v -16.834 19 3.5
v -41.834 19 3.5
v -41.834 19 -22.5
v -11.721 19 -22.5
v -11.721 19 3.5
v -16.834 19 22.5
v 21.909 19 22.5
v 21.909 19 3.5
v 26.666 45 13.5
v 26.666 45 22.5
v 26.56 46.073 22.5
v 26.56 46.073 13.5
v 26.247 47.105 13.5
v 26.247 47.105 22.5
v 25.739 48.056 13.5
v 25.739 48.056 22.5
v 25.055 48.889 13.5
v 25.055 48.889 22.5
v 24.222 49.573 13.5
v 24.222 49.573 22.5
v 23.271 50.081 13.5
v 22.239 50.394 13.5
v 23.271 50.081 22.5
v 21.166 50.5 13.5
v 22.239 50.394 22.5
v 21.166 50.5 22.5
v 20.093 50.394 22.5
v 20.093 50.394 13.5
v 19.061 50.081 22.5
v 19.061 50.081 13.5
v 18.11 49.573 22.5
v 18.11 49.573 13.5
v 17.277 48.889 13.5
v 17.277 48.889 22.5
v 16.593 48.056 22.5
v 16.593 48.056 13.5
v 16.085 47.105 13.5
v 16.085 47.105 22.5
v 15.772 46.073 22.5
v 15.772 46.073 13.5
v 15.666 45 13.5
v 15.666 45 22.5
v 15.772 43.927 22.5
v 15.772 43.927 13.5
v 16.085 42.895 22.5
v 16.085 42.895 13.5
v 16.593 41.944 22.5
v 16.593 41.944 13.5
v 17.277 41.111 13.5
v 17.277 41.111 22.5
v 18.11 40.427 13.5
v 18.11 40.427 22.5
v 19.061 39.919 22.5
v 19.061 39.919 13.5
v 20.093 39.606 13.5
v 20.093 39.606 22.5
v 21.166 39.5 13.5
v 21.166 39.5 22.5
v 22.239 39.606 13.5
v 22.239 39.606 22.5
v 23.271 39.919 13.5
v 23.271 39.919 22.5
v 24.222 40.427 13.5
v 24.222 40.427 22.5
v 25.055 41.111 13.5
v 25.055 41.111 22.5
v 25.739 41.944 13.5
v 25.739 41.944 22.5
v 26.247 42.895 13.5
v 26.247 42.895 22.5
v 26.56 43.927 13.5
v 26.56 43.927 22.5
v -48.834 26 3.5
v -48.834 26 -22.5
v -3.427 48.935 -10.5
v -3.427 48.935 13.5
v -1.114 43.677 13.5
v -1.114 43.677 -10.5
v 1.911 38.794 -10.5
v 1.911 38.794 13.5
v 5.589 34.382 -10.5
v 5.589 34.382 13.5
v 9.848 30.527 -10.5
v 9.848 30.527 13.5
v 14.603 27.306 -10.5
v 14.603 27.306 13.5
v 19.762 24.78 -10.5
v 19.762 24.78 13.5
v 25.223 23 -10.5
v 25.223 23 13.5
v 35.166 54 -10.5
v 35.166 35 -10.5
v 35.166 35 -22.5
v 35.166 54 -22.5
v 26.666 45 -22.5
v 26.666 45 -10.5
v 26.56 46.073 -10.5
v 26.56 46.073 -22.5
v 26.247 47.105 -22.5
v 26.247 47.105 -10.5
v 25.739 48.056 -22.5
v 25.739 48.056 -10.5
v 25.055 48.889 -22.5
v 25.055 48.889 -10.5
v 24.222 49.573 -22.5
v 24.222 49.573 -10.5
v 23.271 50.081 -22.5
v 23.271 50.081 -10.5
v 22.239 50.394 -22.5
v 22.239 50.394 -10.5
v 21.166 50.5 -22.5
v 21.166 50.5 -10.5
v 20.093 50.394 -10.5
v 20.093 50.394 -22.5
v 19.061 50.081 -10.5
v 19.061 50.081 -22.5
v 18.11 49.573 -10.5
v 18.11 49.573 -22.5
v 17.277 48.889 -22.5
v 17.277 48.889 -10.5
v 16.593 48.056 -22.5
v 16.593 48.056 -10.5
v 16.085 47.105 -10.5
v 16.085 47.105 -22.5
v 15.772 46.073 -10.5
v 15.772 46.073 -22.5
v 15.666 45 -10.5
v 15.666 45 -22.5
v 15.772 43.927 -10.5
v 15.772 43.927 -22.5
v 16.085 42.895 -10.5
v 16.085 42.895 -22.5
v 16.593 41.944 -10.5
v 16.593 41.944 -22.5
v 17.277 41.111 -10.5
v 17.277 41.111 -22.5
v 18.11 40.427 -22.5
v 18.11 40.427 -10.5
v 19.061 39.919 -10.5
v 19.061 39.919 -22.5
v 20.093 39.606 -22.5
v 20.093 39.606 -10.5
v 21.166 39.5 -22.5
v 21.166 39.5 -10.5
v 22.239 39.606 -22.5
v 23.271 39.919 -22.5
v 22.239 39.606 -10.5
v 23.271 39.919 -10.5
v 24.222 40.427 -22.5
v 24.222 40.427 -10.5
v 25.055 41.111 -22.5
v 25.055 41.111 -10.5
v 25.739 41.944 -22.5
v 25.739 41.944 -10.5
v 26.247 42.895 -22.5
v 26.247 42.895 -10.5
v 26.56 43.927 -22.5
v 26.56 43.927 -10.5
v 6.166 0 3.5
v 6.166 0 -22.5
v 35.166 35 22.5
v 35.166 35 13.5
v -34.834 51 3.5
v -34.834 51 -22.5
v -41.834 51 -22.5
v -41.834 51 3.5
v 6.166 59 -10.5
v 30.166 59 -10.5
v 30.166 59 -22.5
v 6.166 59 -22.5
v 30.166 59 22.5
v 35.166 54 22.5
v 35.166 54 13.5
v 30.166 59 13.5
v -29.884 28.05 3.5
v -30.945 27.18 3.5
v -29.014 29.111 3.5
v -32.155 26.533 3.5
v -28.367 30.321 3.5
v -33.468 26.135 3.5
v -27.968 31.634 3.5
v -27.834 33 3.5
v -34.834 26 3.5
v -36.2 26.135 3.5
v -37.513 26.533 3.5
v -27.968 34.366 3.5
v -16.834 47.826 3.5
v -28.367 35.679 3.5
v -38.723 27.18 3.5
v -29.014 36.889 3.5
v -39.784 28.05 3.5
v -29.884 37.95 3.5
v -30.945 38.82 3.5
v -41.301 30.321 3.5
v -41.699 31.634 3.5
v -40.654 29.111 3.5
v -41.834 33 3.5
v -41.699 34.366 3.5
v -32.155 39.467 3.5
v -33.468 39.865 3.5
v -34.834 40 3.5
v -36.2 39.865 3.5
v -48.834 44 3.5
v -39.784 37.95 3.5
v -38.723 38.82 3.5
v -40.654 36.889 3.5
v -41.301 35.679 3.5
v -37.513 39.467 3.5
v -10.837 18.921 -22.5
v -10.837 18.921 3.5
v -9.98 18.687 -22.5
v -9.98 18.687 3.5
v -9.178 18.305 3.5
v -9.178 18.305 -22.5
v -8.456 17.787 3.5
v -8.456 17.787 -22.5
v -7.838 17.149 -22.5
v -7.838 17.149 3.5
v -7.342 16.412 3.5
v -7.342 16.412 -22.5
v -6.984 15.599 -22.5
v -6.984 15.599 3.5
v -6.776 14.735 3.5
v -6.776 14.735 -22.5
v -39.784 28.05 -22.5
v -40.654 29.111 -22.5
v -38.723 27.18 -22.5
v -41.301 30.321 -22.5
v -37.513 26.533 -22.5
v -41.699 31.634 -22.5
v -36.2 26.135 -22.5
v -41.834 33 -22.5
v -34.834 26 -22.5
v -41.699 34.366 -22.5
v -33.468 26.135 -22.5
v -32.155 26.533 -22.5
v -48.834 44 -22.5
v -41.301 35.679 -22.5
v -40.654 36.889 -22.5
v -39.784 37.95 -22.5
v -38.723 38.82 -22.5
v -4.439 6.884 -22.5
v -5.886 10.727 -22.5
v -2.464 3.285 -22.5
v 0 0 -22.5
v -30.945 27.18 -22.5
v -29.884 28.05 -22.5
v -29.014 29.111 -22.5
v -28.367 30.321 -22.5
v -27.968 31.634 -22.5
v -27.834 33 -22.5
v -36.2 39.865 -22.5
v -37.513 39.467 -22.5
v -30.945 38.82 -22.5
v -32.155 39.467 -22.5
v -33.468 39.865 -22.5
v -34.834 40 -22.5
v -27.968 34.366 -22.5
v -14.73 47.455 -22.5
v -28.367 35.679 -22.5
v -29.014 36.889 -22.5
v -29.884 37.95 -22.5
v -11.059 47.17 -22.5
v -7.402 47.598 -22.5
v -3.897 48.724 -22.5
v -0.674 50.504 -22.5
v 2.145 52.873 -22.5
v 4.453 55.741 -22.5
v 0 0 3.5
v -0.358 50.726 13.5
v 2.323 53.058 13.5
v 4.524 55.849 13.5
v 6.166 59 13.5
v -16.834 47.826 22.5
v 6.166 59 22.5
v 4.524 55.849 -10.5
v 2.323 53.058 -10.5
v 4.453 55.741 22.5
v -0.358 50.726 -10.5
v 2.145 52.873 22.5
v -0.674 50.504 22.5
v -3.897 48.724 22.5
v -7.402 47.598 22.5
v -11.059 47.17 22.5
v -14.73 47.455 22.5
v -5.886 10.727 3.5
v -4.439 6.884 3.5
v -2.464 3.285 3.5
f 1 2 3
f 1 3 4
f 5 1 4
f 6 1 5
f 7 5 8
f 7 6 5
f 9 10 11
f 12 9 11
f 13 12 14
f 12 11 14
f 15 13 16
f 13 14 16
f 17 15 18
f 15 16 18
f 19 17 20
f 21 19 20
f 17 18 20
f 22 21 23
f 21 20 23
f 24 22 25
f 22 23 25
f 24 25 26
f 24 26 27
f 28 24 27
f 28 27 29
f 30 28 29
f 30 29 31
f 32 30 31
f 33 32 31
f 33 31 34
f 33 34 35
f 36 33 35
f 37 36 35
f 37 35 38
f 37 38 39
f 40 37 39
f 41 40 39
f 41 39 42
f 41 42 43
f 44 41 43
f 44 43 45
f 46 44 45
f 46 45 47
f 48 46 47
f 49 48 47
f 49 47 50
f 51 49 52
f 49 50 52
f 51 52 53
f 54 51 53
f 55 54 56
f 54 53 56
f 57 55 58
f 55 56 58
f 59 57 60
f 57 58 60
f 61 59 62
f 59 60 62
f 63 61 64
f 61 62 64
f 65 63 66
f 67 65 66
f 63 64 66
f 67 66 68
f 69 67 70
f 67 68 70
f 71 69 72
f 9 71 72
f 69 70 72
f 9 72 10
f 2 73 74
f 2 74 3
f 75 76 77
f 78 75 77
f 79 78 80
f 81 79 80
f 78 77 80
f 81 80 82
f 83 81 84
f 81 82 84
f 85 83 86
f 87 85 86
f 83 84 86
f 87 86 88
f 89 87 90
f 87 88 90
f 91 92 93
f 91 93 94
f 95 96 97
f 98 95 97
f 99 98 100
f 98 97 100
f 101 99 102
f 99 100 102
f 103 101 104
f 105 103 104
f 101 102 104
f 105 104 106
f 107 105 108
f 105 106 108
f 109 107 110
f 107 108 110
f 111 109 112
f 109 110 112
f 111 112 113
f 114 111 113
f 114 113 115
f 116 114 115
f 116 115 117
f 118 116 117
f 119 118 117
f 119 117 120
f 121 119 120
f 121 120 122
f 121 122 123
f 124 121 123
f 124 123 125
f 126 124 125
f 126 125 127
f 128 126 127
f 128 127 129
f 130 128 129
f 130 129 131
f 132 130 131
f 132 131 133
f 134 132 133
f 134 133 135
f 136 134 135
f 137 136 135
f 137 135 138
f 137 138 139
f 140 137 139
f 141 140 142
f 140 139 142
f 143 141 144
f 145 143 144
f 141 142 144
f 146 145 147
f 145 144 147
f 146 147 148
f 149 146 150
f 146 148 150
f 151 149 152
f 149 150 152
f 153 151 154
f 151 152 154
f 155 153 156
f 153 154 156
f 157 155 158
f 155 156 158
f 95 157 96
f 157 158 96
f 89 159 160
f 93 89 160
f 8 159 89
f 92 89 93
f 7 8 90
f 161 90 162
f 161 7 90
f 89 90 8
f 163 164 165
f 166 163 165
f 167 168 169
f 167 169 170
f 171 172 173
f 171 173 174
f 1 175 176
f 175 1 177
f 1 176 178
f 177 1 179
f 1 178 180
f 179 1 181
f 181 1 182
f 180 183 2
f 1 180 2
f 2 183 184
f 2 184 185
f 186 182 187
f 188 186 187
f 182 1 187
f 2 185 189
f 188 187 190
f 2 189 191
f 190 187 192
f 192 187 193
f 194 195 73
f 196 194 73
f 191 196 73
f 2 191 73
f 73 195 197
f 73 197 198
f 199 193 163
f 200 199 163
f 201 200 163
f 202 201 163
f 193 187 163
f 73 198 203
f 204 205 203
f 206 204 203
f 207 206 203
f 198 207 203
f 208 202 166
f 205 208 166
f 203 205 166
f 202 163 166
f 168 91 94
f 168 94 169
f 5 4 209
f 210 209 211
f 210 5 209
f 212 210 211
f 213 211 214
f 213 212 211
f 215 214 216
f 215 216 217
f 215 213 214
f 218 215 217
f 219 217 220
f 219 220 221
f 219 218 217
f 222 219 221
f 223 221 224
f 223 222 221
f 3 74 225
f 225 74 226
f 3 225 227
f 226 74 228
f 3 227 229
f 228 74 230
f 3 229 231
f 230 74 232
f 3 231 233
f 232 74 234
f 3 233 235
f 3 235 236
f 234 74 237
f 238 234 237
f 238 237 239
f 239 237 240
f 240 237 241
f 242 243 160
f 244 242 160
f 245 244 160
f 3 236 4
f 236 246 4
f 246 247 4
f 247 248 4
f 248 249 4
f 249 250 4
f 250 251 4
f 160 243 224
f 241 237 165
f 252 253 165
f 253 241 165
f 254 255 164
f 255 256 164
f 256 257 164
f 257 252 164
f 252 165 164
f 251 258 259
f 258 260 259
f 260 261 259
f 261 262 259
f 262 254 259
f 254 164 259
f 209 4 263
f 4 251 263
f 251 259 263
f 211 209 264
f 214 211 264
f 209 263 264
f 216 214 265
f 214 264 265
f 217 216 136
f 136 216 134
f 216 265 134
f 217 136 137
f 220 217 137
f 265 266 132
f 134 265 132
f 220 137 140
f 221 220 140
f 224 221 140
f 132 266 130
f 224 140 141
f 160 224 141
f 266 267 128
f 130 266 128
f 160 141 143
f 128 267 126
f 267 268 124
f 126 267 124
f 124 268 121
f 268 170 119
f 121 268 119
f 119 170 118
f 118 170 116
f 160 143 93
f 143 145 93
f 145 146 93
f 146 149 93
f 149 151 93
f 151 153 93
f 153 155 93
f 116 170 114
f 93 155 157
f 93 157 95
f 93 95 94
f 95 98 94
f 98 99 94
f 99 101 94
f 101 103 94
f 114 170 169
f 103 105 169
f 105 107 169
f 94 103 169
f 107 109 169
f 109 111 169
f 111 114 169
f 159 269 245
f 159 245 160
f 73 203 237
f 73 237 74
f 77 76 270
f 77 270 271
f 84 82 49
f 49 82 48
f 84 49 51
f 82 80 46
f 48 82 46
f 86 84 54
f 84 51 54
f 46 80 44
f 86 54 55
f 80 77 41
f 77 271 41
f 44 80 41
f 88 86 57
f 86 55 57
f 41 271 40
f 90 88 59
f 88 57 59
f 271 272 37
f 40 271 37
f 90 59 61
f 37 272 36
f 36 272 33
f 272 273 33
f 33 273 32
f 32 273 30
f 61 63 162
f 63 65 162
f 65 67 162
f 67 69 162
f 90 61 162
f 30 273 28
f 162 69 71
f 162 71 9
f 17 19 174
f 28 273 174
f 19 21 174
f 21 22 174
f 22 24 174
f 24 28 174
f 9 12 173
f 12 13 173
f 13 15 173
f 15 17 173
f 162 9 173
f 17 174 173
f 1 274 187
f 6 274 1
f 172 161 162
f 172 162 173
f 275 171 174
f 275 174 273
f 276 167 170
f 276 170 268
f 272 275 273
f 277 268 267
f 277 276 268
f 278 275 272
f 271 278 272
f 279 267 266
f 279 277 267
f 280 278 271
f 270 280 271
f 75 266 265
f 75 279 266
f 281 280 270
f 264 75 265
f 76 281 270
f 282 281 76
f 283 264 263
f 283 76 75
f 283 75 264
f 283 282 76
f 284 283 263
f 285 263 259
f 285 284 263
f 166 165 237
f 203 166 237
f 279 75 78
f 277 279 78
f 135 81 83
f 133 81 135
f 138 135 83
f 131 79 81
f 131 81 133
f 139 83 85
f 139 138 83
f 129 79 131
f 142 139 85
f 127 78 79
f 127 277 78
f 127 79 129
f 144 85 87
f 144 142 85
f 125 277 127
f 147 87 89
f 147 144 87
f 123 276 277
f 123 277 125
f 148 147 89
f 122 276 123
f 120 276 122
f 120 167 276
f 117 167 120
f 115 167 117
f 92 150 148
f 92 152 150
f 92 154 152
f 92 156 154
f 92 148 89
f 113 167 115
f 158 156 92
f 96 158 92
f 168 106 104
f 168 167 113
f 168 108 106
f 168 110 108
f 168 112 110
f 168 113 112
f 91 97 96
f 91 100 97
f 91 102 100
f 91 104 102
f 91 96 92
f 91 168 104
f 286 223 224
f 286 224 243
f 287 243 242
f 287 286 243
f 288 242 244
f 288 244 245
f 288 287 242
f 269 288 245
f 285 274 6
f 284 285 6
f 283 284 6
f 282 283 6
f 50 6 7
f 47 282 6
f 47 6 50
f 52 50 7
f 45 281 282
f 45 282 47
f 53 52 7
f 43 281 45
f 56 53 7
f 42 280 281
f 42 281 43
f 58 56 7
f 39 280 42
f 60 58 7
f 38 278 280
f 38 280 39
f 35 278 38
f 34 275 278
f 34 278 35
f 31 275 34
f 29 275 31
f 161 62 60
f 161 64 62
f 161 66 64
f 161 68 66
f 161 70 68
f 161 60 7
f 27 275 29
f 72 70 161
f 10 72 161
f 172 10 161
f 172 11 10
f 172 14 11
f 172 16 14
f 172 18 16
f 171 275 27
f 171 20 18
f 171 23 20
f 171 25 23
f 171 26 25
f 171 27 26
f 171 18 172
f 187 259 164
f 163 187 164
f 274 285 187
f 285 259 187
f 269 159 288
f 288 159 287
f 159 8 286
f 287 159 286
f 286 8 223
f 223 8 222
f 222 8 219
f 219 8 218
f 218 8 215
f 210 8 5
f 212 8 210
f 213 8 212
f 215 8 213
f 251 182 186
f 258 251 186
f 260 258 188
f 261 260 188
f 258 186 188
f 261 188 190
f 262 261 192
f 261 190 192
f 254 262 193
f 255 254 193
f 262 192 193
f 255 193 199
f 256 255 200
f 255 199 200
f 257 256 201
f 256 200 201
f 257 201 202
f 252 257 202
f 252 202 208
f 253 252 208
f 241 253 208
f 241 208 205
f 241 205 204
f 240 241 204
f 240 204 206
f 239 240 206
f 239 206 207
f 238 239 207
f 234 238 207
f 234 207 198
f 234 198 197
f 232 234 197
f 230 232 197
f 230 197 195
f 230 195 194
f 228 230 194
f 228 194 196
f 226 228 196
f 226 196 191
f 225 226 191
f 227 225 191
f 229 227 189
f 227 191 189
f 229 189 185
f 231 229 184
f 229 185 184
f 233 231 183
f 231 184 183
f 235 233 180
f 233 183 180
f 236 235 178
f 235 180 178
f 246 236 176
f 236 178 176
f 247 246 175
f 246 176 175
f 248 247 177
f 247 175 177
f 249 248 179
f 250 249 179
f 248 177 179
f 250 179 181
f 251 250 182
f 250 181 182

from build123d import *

# Parameters (mm, degrees)
BOSS_EXTRU_1_DEPTH      = 22.5
ESQUISSE2_R             = 7
ENL_V_MAT_EXTRU_1_DEPTH = 89.82992258
ENL_V_MAT_EXTRU_2_DEPTH = 19
ENL_V_START             = -9
ENL_V_MAT_EXTRU_3_DEPTH = 24
ESQUISSE6_R             = 5.5
ENL_V_MAT_EXTRU_4_DEPTH = 89.82992258


with BuildPart() as part:
    # Esquisse1 → Boss.-Extru.1 (new, symmetric)
    with BuildSketch(Plane.XY):
        with BuildLine():
            Line((0, 0), (6.166045157, 0))
            Line((6.166045157, 0), (35.166045157, 35))
            Line((35.166045157, 35), (35.166045157, 54))
            Line((35.166045157, 54), (30.166045157, 59))
            Line((30.166045157, 59), (6.166045157, 59))
            ThreePointArc((6.166045157, 59), (-2.242317514, 49.535902458), (-14.729912491, 47.455114912))
            Line((-14.729912491, 47.455114912), (-34.833954843, 51))
            Line((-34.833954843, 51), (-41.833954843, 51))
            Line((-41.833954843, 51), (-48.833954843, 44))
            Line((-48.833954843, 44), (-48.833954843, 26))
            Line((-48.833954843, 26), (-41.833954843, 19))
            Line((-41.833954843, 19), (-11.721441141, 19))
            ThreePointArc((-11.721441141, 19), (-8.45620536, 17.786586232), (-6.7758024, 14.735294118))
            ThreePointArc((-6.7758024, 14.735294118), (-4.438972197, 6.884327939), (0, 0))
        make_face()
    extrude(amount=BOSS_EXTRU_1_DEPTH, both=True)

    # Esquisse2 → Enlèv. mat.-Extru.1 (cut, through all)
    with BuildSketch(Plane.XY.offset(22.5)):
        with Locations((-34.833954843, 33)):
            Circle(ESQUISSE2_R)
    extrude(amount=-ENL_V_MAT_EXTRU_1_DEPTH, mode=Mode.SUBTRACT)

    # Esquisse4 → Enlèv. mat.-Extru.2 (cut)
    with BuildSketch(Plane.XY.offset(22.5)):
        Polygon((-16.833954843, 47.826114347), (-16.833954843, 19), (-41.833954843, 19), (-48.833954843, 26), (-48.833954843, 44), (-41.833954843, 51), (-34.833954843, 51), align=None)
        with BuildLine():
            Line((-11.721441141, 19), (21.9089023, 19))
            Line((21.9089023, 19), (6.166045157, 0))
            Line((6.166045157, 0), (0, 0))
            ThreePointArc((0, 0), (-4.438972197, 6.884327939), (-6.7758024, 14.735294118))
            ThreePointArc((-6.7758024, 14.735294118), (-8.45620536, 17.786586232), (-11.721441141, 19))
        make_face()
    extrude(amount=-ENL_V_MAT_EXTRU_2_DEPTH, mode=Mode.SUBTRACT)

    # Esquisse5 → Enlèv. mat.-Extru.3 (cut)
    with BuildSketch(Plane.XY.offset(22.5).offset(ENL_V_START)):
        with BuildLine():
            Line((25.223188014, 23), (35.166045157, 35))
            Line((35.166045157, 35), (35.166045157, 54))
            Line((35.166045157, 54), (30.166045157, 59))
            Line((30.166045157, 59), (6.166045157, 59))
            ThreePointArc((6.166045157, 59), (2.323444718, 53.058207825), (-3.426832653, 48.93452227))
            ThreePointArc((-3.426832653, 48.93452227), (7.650971958, 32.380053701), (25.223188014, 23))
        make_face()
    extrude(amount=-ENL_V_MAT_EXTRU_3_DEPTH, mode=Mode.SUBTRACT)

    # Esquisse6 → Enlèv. mat.-Extru.4 (cut, through all)
    with BuildSketch(Plane.XY.offset(22.5)):
        with Locations((21.166045157, 45)):
            Circle(ESQUISSE6_R)
    extrude(amount=-ENL_V_MAT_EXTRU_4_DEPTH, mode=Mode.SUBTRACT)


solid = part.part
